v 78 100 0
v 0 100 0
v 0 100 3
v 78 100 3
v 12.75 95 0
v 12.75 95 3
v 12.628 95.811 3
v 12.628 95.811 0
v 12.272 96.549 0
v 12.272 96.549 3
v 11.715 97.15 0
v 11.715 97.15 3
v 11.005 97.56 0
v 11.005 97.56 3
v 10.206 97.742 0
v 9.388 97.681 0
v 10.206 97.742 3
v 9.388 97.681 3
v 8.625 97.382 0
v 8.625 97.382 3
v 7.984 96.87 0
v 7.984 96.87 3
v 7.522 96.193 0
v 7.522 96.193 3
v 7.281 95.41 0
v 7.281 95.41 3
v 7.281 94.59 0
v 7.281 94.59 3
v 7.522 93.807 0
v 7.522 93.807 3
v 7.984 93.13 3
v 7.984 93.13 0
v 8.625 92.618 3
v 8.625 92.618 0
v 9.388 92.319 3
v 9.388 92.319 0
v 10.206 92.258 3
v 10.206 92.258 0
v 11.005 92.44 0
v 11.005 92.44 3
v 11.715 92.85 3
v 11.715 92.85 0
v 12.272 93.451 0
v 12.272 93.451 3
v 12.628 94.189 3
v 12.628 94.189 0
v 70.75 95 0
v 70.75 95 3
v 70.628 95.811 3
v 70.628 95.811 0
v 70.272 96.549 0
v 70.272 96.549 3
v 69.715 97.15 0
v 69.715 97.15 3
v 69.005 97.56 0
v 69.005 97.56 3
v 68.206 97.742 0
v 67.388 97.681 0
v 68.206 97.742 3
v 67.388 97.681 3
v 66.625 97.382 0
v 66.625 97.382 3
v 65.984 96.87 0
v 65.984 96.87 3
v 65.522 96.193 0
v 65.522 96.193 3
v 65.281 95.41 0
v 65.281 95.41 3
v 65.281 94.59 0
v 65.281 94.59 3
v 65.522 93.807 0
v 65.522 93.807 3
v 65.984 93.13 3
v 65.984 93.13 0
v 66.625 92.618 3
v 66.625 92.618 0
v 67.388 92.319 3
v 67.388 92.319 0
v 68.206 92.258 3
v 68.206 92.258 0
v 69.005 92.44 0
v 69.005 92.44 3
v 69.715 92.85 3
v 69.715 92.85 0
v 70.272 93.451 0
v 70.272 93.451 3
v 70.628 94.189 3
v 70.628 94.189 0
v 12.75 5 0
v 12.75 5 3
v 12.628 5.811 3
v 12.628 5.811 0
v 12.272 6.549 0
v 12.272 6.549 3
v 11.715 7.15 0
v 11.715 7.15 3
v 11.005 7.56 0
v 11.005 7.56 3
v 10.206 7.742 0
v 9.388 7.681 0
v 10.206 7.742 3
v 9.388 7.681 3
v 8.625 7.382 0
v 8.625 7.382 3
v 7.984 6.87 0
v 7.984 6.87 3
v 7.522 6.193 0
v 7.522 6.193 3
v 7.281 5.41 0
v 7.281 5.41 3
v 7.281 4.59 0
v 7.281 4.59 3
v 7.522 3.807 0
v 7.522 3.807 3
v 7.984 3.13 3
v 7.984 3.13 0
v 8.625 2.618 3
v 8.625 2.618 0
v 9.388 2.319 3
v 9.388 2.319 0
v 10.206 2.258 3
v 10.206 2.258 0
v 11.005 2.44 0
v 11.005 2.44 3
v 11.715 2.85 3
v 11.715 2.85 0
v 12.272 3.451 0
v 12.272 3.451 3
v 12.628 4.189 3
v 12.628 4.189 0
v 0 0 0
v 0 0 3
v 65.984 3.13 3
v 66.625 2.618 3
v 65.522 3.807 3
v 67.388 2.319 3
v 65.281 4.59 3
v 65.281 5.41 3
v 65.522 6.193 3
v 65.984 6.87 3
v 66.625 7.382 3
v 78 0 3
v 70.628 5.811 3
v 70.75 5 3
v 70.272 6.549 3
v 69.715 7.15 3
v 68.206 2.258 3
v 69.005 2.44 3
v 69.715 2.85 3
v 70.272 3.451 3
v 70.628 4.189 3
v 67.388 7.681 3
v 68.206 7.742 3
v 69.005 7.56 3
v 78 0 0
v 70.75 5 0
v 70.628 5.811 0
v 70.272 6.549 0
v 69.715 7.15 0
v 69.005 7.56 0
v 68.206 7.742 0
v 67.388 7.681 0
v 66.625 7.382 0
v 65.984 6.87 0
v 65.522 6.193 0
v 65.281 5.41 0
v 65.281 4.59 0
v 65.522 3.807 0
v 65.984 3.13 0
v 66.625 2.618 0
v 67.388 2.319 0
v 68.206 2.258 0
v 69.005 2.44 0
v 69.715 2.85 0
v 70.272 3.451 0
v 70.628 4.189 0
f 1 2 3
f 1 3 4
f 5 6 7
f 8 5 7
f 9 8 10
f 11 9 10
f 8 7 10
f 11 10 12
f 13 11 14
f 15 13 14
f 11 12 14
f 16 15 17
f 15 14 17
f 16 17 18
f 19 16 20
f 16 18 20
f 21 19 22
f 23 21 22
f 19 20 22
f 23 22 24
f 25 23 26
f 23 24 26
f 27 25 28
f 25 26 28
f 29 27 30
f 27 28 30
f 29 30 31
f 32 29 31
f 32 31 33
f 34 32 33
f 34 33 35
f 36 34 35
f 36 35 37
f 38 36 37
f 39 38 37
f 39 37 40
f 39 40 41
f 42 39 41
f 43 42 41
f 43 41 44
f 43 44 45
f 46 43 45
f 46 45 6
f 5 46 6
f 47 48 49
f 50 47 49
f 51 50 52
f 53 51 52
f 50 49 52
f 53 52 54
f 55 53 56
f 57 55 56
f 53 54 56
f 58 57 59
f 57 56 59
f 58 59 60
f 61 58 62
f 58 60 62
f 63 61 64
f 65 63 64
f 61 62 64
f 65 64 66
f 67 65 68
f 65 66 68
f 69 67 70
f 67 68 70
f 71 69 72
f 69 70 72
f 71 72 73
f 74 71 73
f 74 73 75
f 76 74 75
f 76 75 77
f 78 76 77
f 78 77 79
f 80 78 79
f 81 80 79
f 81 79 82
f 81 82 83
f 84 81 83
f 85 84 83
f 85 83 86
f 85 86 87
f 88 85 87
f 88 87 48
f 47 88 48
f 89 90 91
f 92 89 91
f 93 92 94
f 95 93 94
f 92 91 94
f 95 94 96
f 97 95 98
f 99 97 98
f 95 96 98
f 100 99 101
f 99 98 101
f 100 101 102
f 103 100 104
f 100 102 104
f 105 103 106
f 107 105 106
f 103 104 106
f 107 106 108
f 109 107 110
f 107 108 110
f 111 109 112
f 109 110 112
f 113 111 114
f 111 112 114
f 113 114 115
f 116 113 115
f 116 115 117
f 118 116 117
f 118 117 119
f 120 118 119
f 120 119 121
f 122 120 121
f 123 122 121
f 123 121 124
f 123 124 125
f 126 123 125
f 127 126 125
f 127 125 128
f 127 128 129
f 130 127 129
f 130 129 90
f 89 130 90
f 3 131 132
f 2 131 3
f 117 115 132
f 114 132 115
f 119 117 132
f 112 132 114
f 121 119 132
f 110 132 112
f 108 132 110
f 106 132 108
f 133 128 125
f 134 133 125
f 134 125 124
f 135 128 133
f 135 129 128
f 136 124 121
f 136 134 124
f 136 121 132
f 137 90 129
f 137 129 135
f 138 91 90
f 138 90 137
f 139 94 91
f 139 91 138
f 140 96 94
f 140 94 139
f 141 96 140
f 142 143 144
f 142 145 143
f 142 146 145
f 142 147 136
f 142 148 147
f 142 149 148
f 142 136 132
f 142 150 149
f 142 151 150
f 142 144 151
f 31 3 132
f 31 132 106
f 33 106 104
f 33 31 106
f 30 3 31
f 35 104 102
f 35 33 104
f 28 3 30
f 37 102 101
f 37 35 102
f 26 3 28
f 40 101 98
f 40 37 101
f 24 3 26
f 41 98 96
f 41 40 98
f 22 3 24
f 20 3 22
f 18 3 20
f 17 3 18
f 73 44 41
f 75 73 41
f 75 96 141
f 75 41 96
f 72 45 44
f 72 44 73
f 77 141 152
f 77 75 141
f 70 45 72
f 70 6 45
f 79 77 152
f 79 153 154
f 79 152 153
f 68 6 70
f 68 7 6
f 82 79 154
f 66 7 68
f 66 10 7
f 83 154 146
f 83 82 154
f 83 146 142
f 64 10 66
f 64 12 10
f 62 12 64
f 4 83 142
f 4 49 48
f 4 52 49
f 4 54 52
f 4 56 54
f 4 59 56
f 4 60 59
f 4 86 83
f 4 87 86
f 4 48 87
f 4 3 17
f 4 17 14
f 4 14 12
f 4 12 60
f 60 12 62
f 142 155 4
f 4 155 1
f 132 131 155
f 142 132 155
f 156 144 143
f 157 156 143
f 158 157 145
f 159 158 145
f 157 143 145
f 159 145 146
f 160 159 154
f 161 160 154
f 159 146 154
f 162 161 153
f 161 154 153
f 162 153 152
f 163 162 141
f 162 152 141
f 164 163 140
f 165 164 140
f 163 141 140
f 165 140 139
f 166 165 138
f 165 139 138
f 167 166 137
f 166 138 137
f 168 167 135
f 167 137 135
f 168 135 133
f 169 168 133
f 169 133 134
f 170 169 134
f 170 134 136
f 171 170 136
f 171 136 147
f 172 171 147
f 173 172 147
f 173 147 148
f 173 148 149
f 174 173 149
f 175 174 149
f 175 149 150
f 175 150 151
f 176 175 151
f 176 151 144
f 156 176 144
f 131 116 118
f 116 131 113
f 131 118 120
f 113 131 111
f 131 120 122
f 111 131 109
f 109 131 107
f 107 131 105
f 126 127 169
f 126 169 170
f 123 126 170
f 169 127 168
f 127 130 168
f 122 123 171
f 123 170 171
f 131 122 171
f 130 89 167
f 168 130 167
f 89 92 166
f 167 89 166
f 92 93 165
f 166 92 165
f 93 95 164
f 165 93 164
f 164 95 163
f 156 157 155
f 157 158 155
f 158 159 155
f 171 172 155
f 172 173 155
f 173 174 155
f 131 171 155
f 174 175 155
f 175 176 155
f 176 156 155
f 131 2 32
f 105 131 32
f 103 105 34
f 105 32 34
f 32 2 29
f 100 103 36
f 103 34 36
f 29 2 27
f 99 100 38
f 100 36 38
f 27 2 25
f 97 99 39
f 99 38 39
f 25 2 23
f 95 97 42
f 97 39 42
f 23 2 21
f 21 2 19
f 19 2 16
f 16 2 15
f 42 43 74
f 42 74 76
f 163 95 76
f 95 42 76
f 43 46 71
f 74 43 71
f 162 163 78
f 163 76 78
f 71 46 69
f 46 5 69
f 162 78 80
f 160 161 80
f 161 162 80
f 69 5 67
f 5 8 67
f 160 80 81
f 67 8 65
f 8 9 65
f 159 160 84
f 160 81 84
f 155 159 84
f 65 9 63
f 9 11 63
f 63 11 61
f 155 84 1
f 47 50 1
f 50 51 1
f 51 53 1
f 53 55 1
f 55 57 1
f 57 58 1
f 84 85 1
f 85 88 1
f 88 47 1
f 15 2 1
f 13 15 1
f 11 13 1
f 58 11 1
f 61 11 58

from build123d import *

# Parameters (mm, degrees)
SKETCH_1_W          = 78
SKETCH_1_H          = 100
EXTRUDE_1_DEPTH     = 3
SKETCH_3_R          = 2.75
CUT_EXTRUDE_1_DEPTH = 10


with BuildPart() as part:
    # 草图1 → 凸台-拉伸1 (new body)
    with BuildSketch(Plane.XY):
        with Locations((39, 50)):
            Rectangle(SKETCH_1_W, SKETCH_1_H)
    extrude(amount=EXTRUDE_1_DEPTH)

    # 草图3 → 切除-拉伸1 (cut)
    with BuildSketch(Plane.XY.offset(3)):
        with Locations((10, 95)):
            Circle(SKETCH_3_R)
        with Locations((10, 5)):
            Circle(SKETCH_3_R)
        with Locations((68, 5)):
            Circle(SKETCH_3_R)
        with Locations((68, 95)):
            Circle(SKETCH_3_R)
    extrude(amount=-CUT_EXTRUDE_1_DEPTH, mode=Mode.SUBTRACT)


solid = part.part
